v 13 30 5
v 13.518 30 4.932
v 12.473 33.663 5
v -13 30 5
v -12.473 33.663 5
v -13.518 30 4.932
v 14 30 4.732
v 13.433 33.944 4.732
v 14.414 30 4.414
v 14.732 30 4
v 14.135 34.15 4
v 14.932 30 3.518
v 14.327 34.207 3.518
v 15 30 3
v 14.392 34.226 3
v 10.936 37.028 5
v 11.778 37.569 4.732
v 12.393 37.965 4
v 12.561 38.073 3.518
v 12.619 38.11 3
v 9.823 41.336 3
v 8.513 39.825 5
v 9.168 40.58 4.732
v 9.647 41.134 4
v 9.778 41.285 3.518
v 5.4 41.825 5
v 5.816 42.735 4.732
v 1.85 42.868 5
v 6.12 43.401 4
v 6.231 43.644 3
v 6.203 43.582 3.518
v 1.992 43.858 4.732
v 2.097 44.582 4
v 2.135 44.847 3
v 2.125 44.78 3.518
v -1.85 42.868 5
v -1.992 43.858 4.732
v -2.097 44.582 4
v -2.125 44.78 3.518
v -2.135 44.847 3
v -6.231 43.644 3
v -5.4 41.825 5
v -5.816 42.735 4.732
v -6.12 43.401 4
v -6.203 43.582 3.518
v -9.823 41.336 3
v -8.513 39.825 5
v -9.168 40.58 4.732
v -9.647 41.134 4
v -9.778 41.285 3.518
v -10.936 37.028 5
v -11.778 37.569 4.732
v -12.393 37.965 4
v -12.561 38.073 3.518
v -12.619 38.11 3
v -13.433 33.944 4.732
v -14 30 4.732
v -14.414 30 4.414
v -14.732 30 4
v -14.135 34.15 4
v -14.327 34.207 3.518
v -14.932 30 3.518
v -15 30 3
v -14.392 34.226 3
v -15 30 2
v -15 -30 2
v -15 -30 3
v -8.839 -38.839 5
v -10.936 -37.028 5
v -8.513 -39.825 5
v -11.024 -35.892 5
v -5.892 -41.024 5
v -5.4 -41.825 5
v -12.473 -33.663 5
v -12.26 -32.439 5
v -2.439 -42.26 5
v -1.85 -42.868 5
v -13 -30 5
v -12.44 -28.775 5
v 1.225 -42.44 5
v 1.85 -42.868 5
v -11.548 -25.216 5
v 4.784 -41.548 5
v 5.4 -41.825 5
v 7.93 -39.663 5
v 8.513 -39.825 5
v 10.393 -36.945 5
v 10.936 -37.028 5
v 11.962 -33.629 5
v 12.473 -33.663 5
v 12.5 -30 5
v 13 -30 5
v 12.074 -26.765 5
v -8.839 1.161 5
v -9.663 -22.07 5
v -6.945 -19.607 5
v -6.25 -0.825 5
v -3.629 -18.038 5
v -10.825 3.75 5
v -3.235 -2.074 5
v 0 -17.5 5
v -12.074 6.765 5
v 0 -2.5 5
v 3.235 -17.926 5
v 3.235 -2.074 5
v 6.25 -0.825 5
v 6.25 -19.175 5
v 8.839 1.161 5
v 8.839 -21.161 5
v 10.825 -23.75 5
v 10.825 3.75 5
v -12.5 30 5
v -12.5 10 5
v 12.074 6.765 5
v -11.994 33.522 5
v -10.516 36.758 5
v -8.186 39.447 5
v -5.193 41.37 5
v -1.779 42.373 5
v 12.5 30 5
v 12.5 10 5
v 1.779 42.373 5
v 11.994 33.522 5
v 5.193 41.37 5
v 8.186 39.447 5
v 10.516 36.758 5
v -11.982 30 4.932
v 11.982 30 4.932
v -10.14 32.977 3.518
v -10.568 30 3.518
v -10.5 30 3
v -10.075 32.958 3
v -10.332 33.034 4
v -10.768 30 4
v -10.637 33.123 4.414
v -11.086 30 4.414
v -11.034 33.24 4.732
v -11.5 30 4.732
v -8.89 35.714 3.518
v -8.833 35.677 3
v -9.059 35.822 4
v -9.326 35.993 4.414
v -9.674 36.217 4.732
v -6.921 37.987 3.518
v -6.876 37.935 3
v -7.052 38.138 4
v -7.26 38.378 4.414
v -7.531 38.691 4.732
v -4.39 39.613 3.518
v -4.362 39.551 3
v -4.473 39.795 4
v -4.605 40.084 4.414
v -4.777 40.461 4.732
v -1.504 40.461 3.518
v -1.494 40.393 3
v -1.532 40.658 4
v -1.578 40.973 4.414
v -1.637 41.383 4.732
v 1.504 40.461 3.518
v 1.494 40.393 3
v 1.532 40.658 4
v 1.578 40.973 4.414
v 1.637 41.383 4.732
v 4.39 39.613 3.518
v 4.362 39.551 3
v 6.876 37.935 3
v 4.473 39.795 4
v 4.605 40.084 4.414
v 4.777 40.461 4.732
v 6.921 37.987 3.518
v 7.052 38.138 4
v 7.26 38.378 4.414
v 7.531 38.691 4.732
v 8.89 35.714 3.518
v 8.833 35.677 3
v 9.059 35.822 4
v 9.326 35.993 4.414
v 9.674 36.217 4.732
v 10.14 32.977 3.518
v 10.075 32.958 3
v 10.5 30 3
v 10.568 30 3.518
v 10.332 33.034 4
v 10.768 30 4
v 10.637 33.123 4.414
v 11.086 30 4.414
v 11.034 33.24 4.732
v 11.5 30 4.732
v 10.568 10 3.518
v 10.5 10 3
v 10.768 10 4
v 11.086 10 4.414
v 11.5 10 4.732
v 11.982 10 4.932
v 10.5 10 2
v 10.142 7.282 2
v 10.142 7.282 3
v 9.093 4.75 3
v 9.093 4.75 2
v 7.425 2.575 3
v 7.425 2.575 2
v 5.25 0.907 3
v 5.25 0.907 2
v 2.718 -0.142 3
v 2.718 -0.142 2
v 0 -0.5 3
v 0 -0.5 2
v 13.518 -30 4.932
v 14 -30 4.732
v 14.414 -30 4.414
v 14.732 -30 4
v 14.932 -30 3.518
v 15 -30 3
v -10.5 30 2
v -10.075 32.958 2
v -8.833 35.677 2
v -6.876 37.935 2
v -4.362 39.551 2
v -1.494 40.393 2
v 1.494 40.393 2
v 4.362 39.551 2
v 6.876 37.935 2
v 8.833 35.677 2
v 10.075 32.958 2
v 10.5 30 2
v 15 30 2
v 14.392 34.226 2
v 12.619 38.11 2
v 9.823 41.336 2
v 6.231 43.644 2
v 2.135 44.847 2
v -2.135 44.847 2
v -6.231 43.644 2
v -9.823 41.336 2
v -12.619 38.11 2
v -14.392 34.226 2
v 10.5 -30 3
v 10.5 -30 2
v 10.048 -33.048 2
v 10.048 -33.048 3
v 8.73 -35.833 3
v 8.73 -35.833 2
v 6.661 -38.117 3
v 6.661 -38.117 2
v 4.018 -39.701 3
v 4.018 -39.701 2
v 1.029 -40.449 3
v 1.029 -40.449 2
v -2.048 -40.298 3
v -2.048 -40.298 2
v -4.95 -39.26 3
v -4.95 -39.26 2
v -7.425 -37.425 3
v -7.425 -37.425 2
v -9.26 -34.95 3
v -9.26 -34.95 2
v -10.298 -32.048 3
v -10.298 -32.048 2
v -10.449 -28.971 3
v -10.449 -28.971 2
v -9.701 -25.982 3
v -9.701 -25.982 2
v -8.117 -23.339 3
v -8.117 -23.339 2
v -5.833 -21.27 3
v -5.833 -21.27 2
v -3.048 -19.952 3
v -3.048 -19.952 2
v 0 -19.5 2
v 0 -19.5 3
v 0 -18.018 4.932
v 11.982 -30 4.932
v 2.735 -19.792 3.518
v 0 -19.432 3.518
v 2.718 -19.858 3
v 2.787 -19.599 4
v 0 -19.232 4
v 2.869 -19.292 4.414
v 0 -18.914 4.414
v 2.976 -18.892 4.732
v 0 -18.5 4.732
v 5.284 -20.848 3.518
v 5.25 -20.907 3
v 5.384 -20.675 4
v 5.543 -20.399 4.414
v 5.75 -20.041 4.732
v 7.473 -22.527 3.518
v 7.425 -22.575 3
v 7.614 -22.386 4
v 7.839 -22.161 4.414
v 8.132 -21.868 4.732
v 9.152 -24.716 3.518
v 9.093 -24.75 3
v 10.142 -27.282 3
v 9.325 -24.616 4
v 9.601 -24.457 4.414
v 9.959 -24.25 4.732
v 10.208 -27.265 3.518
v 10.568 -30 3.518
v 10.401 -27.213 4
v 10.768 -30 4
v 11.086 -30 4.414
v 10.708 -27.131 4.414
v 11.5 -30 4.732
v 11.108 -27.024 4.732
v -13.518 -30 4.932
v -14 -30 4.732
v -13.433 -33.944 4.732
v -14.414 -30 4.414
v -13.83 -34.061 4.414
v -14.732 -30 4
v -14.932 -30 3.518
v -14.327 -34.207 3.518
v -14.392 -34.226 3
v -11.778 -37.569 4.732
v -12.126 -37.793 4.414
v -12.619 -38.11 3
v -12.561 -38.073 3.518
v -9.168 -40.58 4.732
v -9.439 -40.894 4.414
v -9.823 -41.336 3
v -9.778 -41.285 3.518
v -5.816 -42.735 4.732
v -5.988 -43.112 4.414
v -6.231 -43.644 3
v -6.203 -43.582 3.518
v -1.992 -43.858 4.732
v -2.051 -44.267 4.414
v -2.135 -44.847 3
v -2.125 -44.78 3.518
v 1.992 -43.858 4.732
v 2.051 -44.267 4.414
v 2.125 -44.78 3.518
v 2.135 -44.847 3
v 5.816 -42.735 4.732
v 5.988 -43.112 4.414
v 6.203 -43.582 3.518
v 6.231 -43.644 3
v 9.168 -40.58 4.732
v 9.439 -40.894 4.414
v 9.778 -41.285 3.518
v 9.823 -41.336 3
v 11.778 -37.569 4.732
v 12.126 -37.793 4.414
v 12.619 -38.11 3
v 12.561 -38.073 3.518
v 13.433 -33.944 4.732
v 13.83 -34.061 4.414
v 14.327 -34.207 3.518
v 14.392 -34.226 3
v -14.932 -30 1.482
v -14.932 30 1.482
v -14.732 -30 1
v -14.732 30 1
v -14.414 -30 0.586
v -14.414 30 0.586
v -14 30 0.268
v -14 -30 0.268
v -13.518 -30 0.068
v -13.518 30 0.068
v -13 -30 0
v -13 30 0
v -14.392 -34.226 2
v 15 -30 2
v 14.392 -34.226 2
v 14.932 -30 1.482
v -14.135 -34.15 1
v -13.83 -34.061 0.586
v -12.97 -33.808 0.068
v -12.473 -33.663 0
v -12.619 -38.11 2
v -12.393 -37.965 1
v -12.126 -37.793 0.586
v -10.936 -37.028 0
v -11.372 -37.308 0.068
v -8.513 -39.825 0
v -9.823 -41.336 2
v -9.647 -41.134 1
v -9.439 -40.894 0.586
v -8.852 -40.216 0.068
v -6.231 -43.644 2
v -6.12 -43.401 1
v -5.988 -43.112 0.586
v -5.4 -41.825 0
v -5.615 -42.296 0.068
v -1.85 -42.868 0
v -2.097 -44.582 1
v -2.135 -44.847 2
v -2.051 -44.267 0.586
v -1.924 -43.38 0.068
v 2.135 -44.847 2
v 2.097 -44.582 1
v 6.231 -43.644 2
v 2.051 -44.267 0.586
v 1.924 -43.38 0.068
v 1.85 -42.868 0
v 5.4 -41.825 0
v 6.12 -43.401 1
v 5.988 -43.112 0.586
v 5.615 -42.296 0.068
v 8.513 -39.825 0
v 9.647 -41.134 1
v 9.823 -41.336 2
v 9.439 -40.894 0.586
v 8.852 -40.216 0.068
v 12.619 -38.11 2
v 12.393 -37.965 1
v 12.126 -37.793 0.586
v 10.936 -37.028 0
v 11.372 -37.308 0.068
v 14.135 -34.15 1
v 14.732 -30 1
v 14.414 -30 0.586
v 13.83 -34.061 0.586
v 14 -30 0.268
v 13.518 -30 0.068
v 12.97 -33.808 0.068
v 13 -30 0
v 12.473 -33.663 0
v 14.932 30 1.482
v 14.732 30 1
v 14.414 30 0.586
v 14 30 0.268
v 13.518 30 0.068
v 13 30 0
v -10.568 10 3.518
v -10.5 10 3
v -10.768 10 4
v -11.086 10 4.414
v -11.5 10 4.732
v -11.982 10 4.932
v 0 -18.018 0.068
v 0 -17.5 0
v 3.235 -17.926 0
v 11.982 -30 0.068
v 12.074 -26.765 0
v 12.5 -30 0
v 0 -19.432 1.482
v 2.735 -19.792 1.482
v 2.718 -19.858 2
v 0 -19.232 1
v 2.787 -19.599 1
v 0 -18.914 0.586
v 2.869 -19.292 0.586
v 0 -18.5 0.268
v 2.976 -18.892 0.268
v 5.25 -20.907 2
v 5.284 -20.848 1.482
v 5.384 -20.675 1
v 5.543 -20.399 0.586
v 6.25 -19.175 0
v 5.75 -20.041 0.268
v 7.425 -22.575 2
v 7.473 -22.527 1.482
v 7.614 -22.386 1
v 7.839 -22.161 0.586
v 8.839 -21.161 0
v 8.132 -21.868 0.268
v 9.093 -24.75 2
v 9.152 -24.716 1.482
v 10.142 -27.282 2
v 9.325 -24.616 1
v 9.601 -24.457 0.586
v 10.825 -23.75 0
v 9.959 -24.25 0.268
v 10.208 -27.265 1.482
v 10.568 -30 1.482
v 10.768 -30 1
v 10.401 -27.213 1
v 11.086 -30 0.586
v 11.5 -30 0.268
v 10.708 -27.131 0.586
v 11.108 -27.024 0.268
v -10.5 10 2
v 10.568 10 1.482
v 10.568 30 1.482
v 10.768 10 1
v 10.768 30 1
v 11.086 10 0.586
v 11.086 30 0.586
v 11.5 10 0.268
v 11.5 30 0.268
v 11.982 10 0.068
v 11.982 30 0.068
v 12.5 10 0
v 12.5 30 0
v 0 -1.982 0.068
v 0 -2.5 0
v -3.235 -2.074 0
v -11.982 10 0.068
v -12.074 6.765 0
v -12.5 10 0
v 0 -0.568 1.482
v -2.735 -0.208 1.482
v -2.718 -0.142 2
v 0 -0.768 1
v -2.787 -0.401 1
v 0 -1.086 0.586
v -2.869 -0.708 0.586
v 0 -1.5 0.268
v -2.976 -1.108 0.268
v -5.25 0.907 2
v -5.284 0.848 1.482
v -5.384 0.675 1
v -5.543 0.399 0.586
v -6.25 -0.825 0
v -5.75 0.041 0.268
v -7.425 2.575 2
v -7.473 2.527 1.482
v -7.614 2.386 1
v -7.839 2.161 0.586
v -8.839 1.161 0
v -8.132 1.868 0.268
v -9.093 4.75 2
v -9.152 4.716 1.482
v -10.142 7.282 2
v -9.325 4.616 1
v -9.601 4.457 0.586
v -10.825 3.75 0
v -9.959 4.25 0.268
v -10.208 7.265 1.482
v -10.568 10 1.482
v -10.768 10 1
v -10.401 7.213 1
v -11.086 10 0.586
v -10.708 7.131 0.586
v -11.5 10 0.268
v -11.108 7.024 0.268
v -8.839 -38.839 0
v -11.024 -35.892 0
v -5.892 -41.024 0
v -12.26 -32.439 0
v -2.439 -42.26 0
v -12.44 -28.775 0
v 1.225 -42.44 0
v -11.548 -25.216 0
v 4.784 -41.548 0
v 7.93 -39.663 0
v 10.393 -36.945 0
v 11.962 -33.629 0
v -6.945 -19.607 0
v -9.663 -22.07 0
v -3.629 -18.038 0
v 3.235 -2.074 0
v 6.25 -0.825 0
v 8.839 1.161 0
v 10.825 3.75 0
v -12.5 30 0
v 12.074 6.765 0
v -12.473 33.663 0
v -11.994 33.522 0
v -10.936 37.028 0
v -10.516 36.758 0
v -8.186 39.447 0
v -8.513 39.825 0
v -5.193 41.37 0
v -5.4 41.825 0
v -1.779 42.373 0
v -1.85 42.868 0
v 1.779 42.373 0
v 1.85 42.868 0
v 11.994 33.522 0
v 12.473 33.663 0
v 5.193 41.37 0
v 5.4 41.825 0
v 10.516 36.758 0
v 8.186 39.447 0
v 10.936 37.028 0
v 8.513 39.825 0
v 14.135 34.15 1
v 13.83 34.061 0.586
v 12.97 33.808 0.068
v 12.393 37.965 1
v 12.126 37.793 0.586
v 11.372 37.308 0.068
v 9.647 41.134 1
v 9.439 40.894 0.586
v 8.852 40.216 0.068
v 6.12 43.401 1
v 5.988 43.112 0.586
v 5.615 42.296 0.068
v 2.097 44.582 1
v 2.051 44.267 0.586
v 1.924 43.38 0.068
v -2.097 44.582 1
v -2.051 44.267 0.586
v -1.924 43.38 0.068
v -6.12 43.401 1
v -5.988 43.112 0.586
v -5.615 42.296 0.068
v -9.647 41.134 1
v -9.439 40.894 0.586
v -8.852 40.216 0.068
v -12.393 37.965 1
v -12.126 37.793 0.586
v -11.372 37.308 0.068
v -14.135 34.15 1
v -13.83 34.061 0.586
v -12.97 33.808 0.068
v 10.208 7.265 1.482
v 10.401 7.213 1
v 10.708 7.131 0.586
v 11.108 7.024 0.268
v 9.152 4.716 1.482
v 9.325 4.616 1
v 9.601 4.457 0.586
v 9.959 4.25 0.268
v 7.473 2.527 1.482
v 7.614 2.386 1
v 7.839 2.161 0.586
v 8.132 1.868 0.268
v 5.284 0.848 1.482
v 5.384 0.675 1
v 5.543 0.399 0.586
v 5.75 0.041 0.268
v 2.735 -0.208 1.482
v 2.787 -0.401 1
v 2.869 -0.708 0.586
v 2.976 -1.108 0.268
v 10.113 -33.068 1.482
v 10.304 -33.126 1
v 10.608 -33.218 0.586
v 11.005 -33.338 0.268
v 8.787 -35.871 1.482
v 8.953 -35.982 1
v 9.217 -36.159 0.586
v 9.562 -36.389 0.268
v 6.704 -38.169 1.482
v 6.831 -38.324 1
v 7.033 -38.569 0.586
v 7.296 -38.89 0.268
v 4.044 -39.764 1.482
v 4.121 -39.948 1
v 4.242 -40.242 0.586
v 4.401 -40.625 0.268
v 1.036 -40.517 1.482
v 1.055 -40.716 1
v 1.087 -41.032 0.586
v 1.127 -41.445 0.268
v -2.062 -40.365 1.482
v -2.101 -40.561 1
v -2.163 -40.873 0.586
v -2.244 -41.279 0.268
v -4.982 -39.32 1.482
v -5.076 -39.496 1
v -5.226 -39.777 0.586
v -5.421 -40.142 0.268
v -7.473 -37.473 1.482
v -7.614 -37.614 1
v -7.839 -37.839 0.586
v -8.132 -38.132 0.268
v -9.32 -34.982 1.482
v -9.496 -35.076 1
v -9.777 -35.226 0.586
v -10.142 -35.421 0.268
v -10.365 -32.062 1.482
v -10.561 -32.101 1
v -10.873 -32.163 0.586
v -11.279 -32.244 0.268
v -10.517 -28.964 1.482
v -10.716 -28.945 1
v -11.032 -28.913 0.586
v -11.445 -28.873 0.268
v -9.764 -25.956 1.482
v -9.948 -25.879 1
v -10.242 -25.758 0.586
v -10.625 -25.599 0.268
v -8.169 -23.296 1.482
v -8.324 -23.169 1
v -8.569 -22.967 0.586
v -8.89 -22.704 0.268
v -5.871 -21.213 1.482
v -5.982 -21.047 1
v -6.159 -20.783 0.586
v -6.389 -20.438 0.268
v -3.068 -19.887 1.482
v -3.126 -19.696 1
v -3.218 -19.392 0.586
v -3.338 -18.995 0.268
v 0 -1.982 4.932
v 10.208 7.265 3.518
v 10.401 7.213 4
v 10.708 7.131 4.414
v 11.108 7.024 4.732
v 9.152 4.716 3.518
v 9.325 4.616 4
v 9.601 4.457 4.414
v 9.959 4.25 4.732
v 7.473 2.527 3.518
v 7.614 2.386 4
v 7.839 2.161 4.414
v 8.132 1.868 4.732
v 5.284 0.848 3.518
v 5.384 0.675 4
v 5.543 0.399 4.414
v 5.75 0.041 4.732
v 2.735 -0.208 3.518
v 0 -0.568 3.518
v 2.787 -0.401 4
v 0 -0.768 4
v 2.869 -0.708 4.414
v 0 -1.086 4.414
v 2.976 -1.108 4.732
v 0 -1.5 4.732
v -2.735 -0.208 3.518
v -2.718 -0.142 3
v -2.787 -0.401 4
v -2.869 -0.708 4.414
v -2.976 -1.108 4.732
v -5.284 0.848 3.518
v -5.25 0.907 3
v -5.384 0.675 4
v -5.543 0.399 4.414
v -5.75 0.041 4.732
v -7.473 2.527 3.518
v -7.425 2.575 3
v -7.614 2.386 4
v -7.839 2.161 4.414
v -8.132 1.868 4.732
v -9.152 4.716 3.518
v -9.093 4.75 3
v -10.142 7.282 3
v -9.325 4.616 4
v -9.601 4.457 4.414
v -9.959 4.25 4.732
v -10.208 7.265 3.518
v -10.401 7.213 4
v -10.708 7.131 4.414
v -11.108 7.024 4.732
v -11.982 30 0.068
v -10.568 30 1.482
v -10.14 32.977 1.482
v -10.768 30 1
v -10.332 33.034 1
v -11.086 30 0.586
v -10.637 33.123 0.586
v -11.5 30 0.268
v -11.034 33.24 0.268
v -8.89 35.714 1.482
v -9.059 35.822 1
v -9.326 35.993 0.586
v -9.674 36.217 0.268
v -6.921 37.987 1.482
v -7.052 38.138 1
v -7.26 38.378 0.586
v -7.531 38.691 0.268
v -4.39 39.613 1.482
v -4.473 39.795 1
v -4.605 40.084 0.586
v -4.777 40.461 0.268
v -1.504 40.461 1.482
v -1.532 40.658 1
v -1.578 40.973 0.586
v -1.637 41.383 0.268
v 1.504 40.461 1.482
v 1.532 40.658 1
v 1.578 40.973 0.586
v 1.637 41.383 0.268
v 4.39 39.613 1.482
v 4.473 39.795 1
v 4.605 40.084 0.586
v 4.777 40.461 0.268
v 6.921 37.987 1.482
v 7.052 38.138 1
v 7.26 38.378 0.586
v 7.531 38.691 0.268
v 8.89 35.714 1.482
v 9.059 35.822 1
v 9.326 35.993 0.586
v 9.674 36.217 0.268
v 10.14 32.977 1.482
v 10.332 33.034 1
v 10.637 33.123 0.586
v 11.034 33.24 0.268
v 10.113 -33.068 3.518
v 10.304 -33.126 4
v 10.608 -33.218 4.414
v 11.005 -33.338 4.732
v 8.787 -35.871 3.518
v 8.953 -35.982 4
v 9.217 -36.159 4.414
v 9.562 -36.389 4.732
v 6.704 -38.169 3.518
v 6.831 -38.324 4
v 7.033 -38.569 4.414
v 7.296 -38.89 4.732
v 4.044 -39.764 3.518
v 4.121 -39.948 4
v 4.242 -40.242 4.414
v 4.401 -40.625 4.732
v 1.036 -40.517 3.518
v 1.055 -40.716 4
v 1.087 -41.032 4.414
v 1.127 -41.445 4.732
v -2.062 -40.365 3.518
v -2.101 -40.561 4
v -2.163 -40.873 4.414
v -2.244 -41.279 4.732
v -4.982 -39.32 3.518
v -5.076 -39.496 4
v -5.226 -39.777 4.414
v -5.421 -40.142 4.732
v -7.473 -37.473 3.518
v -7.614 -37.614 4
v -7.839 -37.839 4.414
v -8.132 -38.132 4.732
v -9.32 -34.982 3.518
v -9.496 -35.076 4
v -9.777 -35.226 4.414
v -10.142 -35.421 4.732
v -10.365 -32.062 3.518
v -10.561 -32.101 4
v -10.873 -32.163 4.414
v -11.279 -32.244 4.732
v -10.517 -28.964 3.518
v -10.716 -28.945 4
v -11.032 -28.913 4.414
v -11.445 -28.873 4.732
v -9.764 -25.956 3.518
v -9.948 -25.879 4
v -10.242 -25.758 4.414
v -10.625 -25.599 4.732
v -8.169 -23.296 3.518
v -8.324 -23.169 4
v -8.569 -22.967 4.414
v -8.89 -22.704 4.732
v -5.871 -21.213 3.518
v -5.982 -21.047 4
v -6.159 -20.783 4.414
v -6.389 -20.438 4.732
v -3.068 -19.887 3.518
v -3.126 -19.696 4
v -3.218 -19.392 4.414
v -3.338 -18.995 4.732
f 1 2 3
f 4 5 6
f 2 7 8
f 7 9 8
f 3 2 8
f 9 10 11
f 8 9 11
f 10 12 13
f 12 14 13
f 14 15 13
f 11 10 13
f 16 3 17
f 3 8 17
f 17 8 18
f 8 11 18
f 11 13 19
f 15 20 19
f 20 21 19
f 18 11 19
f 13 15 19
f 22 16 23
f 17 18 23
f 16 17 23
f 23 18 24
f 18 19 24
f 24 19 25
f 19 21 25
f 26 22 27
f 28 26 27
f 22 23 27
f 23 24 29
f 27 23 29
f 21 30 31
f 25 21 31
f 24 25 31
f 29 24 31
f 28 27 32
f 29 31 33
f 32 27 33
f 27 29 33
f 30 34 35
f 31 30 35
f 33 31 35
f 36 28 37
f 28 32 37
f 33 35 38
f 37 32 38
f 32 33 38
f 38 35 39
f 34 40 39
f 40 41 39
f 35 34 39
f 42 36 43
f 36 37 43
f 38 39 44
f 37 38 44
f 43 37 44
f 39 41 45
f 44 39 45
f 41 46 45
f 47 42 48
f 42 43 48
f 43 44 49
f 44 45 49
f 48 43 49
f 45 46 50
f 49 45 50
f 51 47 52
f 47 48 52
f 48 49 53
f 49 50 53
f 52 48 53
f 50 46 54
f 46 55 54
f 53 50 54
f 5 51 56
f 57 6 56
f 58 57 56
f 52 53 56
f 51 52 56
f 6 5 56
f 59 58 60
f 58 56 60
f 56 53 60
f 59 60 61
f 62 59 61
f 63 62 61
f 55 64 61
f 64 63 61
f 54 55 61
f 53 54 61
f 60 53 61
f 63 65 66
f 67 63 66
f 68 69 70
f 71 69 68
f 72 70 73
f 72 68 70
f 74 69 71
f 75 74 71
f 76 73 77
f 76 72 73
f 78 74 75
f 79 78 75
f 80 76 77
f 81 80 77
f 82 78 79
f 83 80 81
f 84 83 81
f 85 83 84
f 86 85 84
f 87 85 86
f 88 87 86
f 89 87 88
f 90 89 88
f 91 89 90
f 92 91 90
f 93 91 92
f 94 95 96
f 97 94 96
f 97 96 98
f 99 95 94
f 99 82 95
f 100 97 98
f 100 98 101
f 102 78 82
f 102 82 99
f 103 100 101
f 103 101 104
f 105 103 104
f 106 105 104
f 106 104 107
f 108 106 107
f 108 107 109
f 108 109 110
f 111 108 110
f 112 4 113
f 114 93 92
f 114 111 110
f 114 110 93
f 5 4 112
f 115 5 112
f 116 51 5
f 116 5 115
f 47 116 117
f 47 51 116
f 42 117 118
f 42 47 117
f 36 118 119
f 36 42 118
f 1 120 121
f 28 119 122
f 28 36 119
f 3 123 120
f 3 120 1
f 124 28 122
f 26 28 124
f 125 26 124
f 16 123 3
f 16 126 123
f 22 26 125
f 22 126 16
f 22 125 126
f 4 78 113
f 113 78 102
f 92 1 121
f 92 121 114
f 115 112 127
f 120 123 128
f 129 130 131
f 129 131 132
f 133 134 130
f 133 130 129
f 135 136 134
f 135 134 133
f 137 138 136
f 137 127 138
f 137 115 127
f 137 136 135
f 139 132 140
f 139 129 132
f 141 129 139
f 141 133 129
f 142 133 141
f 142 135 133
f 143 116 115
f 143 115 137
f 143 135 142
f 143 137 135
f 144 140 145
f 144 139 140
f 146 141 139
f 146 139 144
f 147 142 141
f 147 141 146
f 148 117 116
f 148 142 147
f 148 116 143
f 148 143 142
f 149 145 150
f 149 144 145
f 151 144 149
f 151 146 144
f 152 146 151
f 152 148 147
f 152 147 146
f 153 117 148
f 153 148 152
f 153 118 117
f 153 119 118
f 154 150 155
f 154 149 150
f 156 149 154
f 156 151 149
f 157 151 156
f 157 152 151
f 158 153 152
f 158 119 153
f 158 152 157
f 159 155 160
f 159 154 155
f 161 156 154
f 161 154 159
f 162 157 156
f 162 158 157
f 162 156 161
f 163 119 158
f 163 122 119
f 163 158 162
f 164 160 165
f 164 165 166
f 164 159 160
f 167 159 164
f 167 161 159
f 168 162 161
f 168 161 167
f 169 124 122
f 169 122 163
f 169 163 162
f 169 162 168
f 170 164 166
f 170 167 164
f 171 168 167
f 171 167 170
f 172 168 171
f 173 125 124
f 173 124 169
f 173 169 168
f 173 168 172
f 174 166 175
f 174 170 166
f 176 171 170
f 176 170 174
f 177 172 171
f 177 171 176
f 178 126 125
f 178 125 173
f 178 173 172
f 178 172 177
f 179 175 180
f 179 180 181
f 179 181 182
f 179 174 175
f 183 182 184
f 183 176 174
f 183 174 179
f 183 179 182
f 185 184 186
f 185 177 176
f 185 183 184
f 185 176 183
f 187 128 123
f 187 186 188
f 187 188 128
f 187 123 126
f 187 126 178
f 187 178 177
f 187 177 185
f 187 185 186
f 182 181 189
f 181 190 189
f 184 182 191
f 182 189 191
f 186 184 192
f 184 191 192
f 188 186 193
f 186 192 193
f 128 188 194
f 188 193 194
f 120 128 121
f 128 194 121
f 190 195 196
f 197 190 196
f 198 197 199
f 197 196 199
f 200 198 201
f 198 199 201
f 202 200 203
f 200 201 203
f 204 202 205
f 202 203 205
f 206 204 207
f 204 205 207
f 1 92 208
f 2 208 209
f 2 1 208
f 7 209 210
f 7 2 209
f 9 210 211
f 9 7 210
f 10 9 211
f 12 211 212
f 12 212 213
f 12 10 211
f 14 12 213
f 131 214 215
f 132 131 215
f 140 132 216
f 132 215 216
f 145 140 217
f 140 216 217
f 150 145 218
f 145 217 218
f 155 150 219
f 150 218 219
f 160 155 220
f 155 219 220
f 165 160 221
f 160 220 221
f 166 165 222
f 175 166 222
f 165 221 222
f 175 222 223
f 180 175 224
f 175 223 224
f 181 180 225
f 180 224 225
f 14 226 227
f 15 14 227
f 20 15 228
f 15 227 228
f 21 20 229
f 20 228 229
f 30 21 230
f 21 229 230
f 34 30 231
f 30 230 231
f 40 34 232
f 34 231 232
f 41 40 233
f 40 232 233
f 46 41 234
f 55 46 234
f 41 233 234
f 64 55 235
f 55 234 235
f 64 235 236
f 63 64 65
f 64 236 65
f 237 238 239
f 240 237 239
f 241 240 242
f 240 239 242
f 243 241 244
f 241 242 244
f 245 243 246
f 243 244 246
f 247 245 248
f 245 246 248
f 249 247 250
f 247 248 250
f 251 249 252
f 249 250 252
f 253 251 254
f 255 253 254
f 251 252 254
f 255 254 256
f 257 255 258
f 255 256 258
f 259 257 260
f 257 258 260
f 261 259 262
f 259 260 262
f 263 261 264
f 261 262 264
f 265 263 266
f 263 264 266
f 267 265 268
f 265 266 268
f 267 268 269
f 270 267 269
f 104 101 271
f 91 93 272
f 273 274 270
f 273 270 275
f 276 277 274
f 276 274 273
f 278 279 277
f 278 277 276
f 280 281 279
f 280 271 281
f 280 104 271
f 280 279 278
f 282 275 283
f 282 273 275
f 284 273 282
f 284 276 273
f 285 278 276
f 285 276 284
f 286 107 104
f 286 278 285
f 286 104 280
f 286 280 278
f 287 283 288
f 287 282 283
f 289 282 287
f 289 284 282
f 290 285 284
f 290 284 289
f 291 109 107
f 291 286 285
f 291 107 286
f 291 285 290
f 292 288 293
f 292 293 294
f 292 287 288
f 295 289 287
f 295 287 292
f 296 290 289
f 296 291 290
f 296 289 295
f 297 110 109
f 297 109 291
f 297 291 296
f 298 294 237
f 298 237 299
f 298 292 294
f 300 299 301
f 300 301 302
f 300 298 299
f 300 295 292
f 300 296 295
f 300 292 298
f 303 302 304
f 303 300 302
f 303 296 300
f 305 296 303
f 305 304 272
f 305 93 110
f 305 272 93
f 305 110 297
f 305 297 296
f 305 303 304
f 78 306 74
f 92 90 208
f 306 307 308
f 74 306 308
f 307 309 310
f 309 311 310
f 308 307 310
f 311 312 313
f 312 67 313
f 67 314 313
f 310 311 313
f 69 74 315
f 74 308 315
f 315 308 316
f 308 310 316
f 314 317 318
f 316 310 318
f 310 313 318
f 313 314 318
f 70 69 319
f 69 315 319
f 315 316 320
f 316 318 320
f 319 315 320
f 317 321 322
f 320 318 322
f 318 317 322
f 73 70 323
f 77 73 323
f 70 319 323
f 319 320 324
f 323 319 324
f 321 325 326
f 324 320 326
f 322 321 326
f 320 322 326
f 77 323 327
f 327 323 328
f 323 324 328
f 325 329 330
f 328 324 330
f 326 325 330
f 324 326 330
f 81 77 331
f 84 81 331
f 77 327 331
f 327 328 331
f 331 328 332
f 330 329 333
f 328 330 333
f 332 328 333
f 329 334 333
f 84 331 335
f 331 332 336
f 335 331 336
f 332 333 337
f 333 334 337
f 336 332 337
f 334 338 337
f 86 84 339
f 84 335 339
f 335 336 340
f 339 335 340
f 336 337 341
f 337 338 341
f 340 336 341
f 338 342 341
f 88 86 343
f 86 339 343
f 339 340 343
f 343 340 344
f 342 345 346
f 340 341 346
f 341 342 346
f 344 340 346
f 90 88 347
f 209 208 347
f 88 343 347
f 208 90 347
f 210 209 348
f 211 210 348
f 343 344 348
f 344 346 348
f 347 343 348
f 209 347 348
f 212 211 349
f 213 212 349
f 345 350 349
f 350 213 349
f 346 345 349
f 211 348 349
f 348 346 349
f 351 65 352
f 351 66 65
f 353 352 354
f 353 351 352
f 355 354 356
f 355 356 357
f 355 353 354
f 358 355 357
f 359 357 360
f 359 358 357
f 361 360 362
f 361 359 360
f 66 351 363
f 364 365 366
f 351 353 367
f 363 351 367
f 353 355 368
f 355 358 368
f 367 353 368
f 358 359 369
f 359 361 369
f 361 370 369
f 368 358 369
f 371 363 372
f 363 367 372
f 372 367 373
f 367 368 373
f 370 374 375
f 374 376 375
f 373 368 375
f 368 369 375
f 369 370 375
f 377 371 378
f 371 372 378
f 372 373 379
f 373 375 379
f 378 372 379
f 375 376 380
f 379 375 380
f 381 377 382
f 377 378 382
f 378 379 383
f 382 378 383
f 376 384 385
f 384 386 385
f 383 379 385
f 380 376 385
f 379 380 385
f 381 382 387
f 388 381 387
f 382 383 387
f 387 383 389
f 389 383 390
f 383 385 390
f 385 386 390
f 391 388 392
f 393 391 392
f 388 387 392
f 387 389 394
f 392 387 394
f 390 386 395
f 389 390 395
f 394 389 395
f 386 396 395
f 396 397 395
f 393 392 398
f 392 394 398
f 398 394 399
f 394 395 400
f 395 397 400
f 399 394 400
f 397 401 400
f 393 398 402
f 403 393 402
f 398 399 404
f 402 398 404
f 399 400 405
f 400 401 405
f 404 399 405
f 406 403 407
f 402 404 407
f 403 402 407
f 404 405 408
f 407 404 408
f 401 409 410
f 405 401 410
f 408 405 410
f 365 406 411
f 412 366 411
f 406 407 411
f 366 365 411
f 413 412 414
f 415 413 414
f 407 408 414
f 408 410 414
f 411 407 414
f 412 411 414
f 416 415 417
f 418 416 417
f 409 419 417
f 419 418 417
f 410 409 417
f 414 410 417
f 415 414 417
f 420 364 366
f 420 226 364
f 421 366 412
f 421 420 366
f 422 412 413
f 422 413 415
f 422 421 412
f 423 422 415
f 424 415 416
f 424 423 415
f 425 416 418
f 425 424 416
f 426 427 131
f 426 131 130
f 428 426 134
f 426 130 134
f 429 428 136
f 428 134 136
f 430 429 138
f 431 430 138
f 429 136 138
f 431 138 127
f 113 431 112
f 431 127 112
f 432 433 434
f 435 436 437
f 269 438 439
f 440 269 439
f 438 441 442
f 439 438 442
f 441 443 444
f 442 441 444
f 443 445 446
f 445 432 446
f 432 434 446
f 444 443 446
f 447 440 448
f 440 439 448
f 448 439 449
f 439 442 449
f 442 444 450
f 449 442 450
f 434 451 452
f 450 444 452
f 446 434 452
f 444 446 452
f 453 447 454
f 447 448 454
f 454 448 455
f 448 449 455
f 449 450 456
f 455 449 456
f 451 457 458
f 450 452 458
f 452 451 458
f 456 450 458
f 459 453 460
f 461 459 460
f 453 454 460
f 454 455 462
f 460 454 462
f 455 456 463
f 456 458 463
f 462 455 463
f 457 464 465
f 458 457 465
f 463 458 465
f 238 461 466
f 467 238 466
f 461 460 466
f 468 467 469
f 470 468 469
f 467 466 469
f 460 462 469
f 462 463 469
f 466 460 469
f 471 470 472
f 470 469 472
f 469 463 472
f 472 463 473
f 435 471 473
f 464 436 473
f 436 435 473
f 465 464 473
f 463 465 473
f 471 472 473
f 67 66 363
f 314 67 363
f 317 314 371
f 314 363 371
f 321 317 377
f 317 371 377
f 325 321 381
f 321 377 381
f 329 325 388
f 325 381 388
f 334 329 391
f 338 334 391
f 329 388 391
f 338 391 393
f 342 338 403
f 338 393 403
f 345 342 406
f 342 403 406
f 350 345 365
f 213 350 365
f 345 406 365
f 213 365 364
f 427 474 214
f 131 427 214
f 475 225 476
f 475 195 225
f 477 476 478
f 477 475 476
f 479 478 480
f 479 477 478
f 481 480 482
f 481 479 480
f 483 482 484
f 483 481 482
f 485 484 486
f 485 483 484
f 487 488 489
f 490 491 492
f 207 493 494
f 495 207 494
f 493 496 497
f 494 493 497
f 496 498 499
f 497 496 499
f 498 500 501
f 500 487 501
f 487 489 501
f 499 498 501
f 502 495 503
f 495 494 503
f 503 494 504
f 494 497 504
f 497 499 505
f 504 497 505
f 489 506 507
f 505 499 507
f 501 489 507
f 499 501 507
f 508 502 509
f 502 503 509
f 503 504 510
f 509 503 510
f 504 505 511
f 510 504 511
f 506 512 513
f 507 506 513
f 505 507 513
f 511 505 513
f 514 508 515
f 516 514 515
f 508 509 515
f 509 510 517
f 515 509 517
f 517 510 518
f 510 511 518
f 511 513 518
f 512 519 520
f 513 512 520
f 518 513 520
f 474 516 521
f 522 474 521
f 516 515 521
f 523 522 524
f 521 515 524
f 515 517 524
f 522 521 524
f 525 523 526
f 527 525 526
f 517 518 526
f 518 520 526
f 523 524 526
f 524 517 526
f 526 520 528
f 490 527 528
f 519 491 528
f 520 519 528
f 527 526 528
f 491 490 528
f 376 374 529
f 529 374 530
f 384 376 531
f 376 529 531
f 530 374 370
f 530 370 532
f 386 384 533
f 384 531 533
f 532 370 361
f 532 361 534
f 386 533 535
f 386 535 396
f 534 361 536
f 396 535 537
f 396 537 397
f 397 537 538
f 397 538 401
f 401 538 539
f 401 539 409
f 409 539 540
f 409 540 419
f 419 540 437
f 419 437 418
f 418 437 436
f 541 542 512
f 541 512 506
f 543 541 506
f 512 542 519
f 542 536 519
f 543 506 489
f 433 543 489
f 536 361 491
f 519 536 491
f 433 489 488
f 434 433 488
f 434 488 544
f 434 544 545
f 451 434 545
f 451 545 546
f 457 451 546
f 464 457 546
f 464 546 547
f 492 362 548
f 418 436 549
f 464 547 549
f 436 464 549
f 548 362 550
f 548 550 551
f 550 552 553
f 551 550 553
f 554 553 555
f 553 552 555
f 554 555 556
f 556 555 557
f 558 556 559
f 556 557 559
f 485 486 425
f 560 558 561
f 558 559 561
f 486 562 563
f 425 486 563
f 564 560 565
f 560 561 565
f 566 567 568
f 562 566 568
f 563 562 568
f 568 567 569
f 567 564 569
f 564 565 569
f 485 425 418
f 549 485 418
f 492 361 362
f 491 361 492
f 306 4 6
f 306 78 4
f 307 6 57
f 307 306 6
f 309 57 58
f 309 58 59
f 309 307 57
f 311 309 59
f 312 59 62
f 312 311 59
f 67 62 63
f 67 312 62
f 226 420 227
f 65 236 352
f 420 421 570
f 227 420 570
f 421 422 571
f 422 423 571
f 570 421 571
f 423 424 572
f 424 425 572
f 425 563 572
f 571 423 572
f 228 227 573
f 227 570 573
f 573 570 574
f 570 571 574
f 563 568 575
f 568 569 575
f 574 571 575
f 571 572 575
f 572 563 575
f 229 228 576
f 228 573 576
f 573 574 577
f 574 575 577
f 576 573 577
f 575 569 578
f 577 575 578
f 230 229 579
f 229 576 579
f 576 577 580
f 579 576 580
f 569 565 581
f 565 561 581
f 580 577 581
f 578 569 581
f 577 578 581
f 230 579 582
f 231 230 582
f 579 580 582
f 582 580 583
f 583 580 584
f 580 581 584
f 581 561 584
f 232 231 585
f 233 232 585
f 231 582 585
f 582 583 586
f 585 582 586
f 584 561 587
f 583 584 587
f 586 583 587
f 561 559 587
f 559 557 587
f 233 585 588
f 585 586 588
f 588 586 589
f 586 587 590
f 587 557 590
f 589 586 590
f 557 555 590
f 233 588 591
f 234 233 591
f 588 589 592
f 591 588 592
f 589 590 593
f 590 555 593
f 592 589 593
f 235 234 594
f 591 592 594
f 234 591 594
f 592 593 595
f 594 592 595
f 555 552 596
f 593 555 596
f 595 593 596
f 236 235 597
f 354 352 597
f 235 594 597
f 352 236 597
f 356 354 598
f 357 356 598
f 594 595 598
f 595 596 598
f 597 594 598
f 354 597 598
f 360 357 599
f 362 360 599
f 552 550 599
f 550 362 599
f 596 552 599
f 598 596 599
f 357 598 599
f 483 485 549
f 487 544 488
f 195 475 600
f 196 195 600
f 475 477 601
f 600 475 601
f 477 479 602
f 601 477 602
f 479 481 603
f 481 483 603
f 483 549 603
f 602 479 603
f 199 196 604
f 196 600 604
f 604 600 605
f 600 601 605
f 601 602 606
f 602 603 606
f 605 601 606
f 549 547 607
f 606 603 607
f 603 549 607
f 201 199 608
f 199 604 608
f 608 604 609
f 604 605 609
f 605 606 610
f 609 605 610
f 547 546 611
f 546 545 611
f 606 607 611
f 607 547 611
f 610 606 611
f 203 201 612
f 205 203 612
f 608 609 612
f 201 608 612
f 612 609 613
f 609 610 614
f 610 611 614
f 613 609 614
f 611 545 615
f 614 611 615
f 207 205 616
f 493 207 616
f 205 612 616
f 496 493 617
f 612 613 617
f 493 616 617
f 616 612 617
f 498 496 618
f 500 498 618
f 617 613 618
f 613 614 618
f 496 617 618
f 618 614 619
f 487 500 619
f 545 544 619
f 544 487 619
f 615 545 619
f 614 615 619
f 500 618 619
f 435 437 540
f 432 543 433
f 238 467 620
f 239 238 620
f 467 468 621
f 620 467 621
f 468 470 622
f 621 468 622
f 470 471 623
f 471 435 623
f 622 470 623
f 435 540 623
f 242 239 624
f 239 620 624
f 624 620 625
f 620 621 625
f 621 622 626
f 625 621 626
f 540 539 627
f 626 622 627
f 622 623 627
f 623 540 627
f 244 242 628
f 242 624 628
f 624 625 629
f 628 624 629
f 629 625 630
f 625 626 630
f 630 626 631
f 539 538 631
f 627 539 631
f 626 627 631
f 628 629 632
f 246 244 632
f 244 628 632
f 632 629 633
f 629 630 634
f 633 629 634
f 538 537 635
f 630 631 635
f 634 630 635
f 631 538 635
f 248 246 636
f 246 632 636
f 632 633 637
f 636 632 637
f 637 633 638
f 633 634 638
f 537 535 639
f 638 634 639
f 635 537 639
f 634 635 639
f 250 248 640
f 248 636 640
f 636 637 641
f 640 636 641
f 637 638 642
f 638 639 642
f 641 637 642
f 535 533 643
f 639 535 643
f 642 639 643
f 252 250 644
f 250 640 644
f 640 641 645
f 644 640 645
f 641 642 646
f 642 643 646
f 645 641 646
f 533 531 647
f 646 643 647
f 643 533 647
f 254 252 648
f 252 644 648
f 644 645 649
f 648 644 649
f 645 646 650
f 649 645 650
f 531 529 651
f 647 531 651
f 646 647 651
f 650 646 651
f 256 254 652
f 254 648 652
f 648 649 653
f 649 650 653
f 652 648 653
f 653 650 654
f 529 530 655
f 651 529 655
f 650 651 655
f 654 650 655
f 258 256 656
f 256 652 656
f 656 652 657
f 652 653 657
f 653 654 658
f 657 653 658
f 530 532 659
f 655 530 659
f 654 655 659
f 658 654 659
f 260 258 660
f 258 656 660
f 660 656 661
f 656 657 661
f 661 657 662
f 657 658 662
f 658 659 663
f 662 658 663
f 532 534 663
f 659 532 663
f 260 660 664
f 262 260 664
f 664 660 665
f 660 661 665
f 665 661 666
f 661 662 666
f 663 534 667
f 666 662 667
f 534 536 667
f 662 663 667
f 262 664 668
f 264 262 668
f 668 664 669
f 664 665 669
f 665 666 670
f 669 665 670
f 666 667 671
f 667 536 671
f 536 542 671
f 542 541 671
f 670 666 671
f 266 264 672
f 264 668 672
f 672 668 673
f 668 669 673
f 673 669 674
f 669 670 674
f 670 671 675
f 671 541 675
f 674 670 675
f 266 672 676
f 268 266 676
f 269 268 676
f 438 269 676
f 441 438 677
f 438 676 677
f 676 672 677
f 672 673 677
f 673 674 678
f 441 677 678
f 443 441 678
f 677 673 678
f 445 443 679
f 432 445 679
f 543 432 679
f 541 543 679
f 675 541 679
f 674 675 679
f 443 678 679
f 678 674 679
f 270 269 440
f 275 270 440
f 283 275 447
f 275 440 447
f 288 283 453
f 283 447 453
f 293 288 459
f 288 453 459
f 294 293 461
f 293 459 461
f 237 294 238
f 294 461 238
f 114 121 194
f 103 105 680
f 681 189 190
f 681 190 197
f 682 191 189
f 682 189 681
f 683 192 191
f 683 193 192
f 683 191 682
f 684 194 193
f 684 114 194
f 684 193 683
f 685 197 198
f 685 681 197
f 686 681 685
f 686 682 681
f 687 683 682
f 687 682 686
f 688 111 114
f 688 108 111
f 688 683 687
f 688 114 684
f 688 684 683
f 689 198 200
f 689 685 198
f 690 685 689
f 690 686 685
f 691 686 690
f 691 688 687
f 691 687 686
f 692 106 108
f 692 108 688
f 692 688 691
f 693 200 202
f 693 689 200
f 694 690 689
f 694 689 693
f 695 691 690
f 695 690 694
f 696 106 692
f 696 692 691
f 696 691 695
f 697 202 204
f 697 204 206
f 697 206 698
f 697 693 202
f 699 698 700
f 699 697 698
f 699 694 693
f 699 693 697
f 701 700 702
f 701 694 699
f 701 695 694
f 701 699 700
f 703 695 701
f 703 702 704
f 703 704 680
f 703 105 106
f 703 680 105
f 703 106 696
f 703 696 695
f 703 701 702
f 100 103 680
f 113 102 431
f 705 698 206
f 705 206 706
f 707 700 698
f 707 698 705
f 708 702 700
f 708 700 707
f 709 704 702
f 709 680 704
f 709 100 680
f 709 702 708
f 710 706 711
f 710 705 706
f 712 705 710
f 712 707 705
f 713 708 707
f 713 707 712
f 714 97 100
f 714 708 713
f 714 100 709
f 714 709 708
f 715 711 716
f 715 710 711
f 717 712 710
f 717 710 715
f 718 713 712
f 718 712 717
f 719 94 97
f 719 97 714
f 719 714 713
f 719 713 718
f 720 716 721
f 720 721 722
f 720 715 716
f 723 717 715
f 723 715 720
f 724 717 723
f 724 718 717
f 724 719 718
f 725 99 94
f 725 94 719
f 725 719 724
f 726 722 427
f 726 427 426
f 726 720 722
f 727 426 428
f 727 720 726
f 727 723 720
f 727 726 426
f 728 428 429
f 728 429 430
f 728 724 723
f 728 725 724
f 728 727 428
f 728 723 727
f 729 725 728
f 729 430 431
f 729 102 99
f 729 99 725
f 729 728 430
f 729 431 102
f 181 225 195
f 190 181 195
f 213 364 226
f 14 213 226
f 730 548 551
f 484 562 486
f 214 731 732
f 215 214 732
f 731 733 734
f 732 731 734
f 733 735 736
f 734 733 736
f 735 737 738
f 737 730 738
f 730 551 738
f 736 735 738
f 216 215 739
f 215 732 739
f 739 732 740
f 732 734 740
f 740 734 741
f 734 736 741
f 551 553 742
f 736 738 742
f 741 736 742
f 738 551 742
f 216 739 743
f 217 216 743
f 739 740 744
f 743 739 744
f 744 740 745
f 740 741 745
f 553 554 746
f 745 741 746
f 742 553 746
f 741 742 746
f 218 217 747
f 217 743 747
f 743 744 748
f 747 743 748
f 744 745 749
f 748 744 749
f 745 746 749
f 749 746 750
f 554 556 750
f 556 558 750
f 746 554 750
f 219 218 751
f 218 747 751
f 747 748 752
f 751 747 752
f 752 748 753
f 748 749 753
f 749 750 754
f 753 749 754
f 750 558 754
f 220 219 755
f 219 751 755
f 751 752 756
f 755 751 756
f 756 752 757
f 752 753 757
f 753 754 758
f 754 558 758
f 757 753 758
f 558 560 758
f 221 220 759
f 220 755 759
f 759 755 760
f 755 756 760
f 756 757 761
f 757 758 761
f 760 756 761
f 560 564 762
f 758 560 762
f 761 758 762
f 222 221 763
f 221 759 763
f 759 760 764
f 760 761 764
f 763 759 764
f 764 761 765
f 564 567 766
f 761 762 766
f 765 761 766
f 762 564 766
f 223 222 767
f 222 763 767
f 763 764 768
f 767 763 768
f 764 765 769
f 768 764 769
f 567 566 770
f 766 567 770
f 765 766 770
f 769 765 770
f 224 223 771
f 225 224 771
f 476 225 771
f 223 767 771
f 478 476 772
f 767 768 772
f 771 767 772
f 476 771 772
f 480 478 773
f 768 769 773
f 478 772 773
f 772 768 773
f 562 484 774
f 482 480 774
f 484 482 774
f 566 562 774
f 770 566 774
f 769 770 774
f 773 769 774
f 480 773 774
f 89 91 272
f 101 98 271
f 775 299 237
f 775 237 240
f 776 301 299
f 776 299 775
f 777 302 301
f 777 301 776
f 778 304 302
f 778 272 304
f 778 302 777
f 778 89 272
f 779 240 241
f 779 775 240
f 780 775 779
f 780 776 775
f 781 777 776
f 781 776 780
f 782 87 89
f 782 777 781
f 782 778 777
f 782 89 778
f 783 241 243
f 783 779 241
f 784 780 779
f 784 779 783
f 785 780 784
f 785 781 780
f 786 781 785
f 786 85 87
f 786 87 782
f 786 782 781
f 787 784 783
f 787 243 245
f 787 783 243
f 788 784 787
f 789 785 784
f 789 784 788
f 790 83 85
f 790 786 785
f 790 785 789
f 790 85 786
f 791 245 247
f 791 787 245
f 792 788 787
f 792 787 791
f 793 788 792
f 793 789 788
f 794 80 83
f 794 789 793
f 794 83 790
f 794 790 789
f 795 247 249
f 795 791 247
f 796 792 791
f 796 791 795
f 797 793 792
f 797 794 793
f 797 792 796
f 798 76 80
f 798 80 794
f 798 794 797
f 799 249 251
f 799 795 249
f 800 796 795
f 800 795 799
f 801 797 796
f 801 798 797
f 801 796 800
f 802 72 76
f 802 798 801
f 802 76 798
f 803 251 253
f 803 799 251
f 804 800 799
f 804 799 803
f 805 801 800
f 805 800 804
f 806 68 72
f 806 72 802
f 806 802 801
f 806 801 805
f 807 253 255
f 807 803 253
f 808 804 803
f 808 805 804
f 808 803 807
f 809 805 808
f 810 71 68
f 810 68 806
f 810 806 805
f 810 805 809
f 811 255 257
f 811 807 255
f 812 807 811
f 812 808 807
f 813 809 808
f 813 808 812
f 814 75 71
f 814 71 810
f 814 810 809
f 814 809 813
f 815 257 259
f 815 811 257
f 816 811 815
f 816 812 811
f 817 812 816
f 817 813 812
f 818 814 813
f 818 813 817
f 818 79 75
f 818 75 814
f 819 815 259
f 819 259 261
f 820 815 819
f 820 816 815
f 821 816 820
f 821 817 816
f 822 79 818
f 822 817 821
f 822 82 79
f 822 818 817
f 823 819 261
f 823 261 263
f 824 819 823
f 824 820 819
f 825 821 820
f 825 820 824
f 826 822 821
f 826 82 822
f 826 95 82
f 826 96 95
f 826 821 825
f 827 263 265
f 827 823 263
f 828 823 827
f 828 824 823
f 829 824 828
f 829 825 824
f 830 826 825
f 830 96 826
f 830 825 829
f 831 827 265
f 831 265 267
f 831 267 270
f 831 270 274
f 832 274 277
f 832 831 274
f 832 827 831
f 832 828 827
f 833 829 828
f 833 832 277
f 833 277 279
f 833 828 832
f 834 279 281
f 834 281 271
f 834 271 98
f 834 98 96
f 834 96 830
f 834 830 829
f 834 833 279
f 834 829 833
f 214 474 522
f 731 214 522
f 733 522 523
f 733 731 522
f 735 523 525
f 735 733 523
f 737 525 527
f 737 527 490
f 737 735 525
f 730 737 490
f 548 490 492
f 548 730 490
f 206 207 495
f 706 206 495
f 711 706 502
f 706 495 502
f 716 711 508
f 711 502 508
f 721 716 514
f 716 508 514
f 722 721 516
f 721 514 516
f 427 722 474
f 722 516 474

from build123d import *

# Parameters (mm, degrees)
F1_DEPTH = 5
F2_R     = 2
F3_R     = 2


with BuildPart() as f1:
    # F0 (on Top) → F1 (new body)
    with BuildSketch(Plane.XY):
        with BuildLine():
            ThreePointArc((15, 30), (0, 45), (-15, 30))
            Line((-15, 30), (-15, -30))
            ThreePointArc((-15, -30), (0, -45), (15, -30))
            Line((15, -30), (15, 30))
        make_face()
        with BuildLine():
            ThreePointArc((10.5, -30), (-7.4246212025, -37.4246212025), (0, -19.5))
            ThreePointArc((0, -19.5), (7.4246212025, -22.5753787975), (10.5, -30))
        make_face(mode=Mode.SUBTRACT)
        with BuildLine():
            ThreePointArc((10.5, 10), (7.4246212025, 2.5753787975), (0, -0.5))
            ThreePointArc((0, -0.5), (-7.4246212025, 2.5753787975), (-10.5, 10))
            Line((-10.5, 10), (-10.5, 30))
            ThreePointArc((-10.5, 30), (0, 40.5), (10.5, 30))
            Line((10.5, 30), (10.5, 10))
        make_face(mode=Mode.SUBTRACT)
    extrude(amount=F1_DEPTH)

    # F2
    f2_edges = [f1.edges().sort_by_distance(p)[0] for p in [
        (0, 40.5, 5),
        (0, 40.5, 0),
        (15, 0, 0),
        (0, -40.5, 5),
        (0, -40.5, 0),
    ]]
    fillet(f2_edges, radius=F2_R)

    # F3
    f3_edges = [f1.edges().sort_by_distance(p)[0] for p in [
        (-15, 0, 5),
    ]]
    fillet(f3_edges, radius=F3_R)


solid = f1.part
